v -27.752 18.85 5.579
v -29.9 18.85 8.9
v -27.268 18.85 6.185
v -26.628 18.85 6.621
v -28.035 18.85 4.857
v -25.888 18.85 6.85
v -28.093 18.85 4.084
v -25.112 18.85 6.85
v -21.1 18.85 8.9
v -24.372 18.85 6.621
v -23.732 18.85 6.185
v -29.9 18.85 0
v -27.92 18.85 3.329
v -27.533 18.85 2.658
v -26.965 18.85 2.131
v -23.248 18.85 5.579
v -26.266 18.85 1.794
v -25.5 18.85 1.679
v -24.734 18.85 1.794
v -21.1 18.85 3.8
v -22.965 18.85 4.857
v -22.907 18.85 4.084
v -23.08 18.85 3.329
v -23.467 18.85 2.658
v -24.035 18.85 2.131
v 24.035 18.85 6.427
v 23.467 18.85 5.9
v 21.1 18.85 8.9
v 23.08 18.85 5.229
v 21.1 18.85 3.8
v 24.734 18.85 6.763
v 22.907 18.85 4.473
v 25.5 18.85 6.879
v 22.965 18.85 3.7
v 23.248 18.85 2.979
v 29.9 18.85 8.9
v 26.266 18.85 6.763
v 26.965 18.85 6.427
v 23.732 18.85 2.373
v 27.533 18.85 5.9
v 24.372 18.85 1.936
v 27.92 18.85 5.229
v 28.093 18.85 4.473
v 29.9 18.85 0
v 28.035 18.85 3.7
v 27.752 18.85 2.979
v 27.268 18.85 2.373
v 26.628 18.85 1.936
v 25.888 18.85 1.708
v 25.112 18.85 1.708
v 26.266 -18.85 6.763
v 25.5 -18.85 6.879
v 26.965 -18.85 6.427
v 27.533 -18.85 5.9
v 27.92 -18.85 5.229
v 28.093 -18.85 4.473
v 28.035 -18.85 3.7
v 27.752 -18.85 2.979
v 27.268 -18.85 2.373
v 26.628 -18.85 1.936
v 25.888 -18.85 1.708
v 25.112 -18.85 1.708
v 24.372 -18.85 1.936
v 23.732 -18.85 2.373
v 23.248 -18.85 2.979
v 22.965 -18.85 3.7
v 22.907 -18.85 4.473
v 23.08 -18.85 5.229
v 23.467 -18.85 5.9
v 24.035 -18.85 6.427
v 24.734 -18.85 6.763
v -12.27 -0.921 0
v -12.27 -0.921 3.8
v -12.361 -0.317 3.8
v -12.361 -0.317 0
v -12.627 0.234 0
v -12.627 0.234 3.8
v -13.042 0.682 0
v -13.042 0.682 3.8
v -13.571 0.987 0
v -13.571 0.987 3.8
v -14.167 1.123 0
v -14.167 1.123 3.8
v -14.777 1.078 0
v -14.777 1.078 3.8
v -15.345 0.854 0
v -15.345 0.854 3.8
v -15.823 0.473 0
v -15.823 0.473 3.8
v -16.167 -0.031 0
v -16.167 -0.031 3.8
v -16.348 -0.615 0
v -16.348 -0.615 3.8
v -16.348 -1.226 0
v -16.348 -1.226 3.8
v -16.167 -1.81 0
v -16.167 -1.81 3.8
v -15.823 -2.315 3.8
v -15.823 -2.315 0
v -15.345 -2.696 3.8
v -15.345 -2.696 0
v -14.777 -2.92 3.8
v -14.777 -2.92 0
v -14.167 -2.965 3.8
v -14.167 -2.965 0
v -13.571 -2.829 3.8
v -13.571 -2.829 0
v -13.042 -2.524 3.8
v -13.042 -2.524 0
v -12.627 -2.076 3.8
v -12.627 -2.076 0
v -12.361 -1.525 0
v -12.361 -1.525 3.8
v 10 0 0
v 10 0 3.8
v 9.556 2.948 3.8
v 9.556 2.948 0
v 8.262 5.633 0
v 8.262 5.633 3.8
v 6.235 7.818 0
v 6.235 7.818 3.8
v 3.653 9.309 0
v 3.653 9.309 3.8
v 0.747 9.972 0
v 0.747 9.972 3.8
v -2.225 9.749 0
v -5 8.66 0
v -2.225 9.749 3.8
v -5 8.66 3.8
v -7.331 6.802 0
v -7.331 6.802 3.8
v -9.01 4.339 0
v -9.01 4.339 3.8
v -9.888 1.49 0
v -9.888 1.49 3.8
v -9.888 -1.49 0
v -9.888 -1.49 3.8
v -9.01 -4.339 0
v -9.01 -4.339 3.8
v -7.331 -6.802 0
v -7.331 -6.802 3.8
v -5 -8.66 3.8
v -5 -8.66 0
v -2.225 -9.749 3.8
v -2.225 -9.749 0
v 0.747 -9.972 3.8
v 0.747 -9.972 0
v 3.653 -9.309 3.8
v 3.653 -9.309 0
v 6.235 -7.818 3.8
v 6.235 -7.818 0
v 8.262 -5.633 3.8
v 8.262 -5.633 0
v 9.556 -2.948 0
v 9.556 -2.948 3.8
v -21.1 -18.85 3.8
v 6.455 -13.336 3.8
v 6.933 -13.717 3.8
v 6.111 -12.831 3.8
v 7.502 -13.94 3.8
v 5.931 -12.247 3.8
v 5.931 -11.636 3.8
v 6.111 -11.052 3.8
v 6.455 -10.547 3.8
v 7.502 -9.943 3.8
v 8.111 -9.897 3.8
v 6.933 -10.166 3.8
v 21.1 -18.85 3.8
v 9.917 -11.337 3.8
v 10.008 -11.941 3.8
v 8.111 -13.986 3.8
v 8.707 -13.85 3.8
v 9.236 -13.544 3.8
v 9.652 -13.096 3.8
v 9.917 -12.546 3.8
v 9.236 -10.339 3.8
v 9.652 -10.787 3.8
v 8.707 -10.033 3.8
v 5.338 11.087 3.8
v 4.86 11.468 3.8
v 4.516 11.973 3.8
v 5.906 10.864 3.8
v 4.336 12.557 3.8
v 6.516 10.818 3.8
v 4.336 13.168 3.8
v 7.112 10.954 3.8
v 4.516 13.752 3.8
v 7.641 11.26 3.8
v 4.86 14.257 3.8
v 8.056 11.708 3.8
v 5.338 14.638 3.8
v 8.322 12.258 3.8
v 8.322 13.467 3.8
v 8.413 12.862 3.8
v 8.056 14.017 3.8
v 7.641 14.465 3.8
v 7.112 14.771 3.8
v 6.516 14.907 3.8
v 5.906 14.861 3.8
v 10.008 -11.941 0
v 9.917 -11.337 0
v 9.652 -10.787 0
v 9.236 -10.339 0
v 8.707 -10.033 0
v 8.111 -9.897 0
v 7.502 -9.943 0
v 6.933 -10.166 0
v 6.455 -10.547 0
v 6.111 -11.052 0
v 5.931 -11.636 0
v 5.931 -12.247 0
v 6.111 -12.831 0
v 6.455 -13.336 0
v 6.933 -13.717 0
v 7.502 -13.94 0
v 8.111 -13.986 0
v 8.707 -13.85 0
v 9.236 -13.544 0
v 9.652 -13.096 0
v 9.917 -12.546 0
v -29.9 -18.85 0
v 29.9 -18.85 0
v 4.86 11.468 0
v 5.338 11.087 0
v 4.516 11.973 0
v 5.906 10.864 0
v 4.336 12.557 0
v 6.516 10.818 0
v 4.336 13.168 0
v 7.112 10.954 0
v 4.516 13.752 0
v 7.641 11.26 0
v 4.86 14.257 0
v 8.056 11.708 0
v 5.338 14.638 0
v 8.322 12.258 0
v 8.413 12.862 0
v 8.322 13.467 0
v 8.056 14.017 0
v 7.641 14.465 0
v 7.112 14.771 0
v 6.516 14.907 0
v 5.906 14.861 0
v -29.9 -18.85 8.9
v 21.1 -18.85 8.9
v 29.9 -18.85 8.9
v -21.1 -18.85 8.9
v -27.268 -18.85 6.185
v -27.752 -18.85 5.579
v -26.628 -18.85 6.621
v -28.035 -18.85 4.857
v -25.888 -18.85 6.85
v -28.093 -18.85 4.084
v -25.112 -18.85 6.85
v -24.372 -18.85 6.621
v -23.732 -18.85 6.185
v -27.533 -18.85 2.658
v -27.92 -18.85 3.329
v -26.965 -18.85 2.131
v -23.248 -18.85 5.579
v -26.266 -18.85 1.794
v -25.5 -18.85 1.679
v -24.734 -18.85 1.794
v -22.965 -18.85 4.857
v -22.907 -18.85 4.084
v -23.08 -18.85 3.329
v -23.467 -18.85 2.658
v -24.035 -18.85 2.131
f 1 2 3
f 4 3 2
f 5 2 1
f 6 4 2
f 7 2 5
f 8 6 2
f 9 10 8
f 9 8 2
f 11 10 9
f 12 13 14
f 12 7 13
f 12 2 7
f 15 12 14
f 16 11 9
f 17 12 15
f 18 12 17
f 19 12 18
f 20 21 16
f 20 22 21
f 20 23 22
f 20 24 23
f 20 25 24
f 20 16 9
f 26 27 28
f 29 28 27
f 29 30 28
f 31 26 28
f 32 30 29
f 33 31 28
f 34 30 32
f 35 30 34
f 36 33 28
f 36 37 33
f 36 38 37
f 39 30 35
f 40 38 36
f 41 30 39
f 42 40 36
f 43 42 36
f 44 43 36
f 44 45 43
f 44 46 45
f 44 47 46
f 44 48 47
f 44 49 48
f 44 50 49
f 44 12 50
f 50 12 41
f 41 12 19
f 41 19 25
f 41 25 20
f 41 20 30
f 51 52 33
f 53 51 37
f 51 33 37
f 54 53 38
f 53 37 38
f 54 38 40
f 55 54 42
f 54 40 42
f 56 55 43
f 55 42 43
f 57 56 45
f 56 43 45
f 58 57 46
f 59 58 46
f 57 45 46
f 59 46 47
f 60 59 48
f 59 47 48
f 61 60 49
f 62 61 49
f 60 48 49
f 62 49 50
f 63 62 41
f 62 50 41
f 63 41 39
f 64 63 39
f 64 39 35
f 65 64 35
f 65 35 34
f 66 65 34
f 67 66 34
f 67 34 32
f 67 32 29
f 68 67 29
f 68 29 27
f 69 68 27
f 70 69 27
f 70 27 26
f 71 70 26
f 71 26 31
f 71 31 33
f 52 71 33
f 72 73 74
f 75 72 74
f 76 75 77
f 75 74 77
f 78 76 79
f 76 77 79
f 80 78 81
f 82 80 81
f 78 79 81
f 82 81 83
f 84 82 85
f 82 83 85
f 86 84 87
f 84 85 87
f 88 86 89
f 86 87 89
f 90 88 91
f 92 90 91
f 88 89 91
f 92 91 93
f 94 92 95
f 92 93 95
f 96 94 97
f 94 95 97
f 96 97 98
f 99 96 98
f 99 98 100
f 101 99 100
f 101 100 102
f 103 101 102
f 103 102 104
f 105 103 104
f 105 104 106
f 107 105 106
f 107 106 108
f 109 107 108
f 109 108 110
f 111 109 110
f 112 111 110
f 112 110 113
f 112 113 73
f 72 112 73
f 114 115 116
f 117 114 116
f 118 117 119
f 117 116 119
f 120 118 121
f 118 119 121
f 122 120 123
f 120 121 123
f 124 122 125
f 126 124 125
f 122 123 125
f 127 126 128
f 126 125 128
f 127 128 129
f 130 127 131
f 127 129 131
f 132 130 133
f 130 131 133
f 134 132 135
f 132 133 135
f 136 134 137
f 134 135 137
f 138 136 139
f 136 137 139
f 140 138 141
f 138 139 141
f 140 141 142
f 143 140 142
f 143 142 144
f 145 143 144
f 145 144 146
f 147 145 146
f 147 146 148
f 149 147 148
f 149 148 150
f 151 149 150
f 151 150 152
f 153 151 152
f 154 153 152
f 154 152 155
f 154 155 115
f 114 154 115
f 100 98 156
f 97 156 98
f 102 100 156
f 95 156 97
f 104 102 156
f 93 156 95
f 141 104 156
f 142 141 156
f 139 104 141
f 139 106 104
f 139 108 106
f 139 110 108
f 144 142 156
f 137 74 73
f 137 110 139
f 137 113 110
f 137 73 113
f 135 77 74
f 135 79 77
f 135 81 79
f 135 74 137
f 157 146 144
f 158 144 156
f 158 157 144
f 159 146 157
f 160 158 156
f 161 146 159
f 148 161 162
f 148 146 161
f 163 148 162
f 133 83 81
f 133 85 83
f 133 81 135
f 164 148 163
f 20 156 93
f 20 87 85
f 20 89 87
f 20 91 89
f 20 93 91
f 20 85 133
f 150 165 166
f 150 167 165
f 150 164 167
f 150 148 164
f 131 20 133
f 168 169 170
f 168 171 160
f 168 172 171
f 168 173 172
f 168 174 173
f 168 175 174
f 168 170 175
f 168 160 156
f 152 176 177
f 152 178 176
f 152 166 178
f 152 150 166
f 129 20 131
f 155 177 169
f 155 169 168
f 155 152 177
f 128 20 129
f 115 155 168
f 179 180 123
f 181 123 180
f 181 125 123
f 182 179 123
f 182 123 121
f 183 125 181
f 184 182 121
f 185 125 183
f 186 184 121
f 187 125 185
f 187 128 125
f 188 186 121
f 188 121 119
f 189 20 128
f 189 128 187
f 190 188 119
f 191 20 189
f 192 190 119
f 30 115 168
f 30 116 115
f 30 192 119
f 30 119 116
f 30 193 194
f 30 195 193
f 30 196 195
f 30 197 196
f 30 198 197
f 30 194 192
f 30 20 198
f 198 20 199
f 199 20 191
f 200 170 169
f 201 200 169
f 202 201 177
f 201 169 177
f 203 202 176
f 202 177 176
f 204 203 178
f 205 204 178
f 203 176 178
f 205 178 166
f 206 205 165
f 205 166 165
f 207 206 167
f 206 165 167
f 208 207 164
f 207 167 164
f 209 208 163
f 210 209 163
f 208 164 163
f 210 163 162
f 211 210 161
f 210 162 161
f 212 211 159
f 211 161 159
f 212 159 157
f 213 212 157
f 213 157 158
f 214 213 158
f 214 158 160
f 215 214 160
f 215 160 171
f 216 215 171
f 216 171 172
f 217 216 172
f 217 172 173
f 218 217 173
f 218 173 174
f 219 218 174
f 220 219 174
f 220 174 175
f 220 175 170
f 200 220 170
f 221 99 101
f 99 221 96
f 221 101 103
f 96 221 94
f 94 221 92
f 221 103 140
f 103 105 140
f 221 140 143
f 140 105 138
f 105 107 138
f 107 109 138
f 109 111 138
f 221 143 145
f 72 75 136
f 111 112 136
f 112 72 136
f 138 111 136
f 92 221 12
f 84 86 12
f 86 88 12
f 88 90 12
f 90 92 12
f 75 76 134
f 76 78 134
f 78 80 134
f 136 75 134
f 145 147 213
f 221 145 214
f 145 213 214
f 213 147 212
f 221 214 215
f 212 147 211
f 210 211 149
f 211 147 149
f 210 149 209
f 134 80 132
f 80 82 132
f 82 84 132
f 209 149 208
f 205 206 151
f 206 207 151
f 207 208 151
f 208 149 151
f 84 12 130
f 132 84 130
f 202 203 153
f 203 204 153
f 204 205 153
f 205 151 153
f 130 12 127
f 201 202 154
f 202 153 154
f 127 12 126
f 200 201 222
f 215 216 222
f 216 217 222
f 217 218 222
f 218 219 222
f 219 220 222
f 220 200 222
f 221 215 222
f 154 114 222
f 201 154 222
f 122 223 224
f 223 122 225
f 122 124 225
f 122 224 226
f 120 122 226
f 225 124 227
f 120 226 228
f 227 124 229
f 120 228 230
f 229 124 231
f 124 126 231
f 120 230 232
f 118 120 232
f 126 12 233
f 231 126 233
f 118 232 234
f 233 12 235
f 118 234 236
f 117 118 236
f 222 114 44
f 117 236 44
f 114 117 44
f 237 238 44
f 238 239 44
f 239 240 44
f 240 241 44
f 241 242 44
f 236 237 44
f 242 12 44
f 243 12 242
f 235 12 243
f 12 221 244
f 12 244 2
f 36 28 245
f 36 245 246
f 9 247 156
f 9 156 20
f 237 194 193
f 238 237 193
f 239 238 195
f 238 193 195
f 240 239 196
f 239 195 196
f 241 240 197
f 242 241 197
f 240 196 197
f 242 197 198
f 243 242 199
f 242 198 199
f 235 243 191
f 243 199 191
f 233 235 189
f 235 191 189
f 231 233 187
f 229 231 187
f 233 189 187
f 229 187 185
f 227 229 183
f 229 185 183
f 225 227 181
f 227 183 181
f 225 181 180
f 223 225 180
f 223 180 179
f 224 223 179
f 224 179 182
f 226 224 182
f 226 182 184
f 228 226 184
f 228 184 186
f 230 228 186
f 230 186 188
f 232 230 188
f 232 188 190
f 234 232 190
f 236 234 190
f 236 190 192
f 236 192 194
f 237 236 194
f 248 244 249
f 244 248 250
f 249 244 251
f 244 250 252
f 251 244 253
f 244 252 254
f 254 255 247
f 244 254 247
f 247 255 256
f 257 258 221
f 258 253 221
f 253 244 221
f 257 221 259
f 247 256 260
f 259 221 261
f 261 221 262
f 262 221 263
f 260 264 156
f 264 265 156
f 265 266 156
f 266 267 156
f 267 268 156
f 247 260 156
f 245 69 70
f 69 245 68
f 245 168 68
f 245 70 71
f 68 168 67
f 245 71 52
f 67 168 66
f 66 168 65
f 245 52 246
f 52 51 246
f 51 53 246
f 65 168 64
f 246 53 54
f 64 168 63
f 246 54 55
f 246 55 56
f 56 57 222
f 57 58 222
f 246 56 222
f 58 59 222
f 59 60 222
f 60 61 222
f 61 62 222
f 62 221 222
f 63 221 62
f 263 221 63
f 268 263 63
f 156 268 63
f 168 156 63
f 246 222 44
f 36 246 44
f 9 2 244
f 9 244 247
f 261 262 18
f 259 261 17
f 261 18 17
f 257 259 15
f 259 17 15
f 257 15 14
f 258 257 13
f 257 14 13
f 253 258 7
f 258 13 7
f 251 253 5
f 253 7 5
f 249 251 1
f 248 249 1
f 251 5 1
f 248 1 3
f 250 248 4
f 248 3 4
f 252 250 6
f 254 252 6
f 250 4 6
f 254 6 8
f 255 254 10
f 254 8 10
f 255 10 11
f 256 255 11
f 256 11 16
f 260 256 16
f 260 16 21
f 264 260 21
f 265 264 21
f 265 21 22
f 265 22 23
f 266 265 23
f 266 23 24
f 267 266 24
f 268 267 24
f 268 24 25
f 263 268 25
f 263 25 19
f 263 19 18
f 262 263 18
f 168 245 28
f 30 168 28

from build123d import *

# Parameters (mm, degrees)
SKETCH1_W           = 59.8
SKETCH1_H           = 37.7
BOSS_EXTRUDE1_DEPTH = 8.9
SKETCH2_W           = 42.2
SKETCH2_H           = 37.7
CUT_EXTRUDE1_DEPTH  = 5.1
SKETCH3_R           = 2.6
CUT_EXTRUDE2_DEPTH  = 49.933730698
SKETCH4_R           = 10
SKETCH4_R_2         = 2.05
CUT_EXTRUDE3_DEPTH  = 36.71193778


with BuildPart() as part:
    # Sketch1 → Boss-Extrude1 (new body)
    with BuildSketch(Plane.XY):
        Rectangle(SKETCH1_W, SKETCH1_H)
    extrude(amount=BOSS_EXTRUDE1_DEPTH)

    # Sketch2 → Cut-Extrude1 (cut)
    with BuildSketch(Plane.XY.offset(8.9)):
        Rectangle(SKETCH2_W, SKETCH2_H)
    extrude(amount=-CUT_EXTRUDE1_DEPTH, mode=Mode.SUBTRACT)

    # Sketch3 → Cut-Extrude2 (cut, through all)
    with BuildSketch(Plane(origin=(0, 18.85, 0), x_dir=(1, 0, 0), z_dir=(0, 1, 0))):
        with Locations(Location((25.5, -4.278740656, 0), (0, 0, 270))):
            Circle(SKETCH3_R)
        with Locations(Location((-25.5, -4.278740656, 0), (0, 0, 90))):
            Circle(SKETCH3_R)
    extrude(amount=-CUT_EXTRUDE2_DEPTH, mode=Mode.SUBTRACT)

    # Sketch4 → Cut-Extrude3 (cut, through all)
    with BuildSketch(Plane.XY.offset(3.8)):
        Circle(SKETCH4_R)
        with Locations((7.957753458, -11.941384338)):
            Circle(SKETCH4_R_2)
        with Locations((-14.320418922, -0.920924483)):
            Circle(SKETCH4_R_2)
        with Locations((6.362665464, 12.862308821)):
            Circle(SKETCH4_R_2)
    extrude(amount=-CUT_EXTRUDE3_DEPTH, mode=Mode.SUBTRACT)


solid = part.part
